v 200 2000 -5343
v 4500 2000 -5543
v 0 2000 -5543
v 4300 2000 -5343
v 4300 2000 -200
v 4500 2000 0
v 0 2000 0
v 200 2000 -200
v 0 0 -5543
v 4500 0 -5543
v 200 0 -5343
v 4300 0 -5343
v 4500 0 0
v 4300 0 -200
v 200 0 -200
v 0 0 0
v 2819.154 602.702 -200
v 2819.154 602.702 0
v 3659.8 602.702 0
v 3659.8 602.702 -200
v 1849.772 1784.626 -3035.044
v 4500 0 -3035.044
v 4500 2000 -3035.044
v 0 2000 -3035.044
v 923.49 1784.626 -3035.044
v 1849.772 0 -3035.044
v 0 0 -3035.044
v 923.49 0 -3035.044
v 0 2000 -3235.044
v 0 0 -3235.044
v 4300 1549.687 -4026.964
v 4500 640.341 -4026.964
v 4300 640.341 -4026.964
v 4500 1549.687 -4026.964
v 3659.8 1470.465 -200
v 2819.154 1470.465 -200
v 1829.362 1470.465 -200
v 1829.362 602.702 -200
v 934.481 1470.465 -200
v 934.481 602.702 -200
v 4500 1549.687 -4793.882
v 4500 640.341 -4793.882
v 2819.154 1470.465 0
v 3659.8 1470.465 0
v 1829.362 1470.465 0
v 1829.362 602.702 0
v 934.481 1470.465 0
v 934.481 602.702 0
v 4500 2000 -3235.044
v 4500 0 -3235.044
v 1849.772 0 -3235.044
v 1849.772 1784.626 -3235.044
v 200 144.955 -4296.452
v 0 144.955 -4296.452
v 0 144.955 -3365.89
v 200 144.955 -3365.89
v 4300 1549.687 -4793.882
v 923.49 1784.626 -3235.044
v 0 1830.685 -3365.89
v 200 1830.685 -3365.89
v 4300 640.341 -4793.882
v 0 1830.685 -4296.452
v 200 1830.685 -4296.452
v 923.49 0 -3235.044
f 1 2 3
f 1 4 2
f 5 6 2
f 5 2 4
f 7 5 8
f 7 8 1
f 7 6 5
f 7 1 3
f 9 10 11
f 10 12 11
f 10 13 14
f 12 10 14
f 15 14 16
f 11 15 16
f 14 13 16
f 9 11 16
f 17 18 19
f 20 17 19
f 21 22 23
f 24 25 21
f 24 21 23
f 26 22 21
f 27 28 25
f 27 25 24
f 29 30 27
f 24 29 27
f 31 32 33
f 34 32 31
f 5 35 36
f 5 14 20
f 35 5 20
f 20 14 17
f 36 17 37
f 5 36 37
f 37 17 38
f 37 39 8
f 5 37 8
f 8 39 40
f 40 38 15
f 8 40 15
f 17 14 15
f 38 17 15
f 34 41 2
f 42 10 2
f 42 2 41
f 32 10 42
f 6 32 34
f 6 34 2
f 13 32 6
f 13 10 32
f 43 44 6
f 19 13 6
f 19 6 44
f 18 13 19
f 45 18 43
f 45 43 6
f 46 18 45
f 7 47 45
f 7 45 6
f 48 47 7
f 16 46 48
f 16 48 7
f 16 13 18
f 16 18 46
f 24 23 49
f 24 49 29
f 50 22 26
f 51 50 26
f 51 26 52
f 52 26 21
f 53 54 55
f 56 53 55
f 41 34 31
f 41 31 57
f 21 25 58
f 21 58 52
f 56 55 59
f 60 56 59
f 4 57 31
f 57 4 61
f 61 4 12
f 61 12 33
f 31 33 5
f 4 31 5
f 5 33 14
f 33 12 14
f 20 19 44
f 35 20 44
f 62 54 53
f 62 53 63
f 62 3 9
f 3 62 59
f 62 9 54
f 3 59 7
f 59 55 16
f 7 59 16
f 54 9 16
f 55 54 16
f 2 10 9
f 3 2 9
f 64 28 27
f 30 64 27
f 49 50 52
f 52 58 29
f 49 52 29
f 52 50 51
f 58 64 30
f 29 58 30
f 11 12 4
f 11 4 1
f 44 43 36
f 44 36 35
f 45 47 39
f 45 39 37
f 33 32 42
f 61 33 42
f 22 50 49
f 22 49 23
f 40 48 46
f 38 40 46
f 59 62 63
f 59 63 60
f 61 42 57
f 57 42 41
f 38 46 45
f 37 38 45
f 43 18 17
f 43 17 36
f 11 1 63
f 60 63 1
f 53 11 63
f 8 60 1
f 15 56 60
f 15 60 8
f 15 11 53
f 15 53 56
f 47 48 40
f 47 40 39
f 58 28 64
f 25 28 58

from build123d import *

# Parameters (mm, degrees)
EXTRUDE_1_OUTLINE_W   = 4500
EXTRUDE_1_OUTLINE_H   = 5543
EXTRUDE_1_OUTLINE_W_2 = 4100
EXTRUDE_1_OUTLINE_H_2 = 5143
EXTRUDE_1_DEPTH       = 2000
EXTRUDE_1_2_OUTLINE_W = 4500
EXTRUDE_1_2_OUTLINE_H = 200
EXTRUDE_1_2_DEPTH     = 2000
SKETCH_3_W            = 894.880767268
SKETCH_3_H            = 867.76316826
SKETCH_3_W_2          = 840.645569252
CUT_EXTRUDE_1_DEPTH   = 200
SKETCH_4_W            = 926.281817019
SKETCH_4_H            = 1784.625837091
CUT_EXTRUDE_2_DEPTH   = 200
SKETCH_5_W            = 766.917931954
SKETCH_5_H            = 909.345547887
CUT_EXTRUDE_3_DEPTH   = 200
SKETCH_6_W            = 930.561753535
SKETCH_6_H            = 1685.729668706
CUT_EXTRUDE_4_DEPTH   = 200


# Read off the part's stored shape, not the designer's step: Вытянуть-Тонкостенный1
with BuildPart() as part:
    # Вытянуть-Тонкостенный1 outline → Вытянуть-Тонкостенный1 (new body)
    with BuildSketch(Plane(origin=(0, 0, 0), x_dir=(-1, 0, 0), z_dir=(0, 1, 0))):
        with Locations((-2250, -2771.5)):
            Rectangle(EXTRUDE_1_OUTLINE_W, EXTRUDE_1_OUTLINE_H)
        with Locations((-2250, -2771.5)):
            Rectangle(EXTRUDE_1_OUTLINE_W_2, EXTRUDE_1_OUTLINE_H_2, mode=Mode.SUBTRACT)
    extrude(amount=EXTRUDE_1_DEPTH)

    # Эскиз3 → Вырез-Вытянуть1 (cut)
    with BuildSketch(Plane.XY):
        with Locations((1381.9214075, 1036.583100649)):
            Rectangle(SKETCH_3_W, SKETCH_3_H)
        with Locations((3239.476939556, 1036.583100649)):
            Rectangle(SKETCH_3_W_2, SKETCH_3_H)
    extrude(amount=-CUT_EXTRUDE_1_DEPTH, mode=Mode.SUBTRACT)

    # Эскиз5 → Вырез-Вытянуть3 (cut)
    with BuildSketch(Plane(origin=(4500, 0, 0), x_dir=(0, 0, -1), z_dir=(1, 0, 0))):
        with Locations((4410.423442282, 1095.014257943)):
            Rectangle(SKETCH_5_W, SKETCH_5_H)
    extrude(amount=-CUT_EXTRUDE_3_DEPTH, mode=Mode.SUBTRACT)

    # Эскиз6 → Вырез-Вытянуть4 (cut)
    with BuildSketch(Plane.ZY):
        with Locations((-3831.171106774, 987.819872336)):
            Rectangle(SKETCH_6_W, SKETCH_6_H)
    extrude(amount=-CUT_EXTRUDE_4_DEPTH, mode=Mode.SUBTRACT)


with BuildPart() as body_2:
    # Extrude 1 2 outline → Extrude 1 2 (new body)
    with BuildSketch(Plane(origin=(0, 0, 0), x_dir=(-1, 0, 0), z_dir=(0, 1, 0))):
        with Locations((-2250, -3135.044271929)):
            Rectangle(EXTRUDE_1_2_OUTLINE_W, EXTRUDE_1_2_OUTLINE_H)
    extrude(amount=EXTRUDE_1_2_DEPTH)

    # Эскиз4 → Вырез-Вытянуть2 (cut)
    with BuildSketch(Plane.XY.offset(-3035.044271929)):
        with Locations((1386.631071625, 892.312918546)):
            Rectangle(SKETCH_4_W, SKETCH_4_H)
    extrude(amount=-CUT_EXTRUDE_2_DEPTH, mode=Mode.SUBTRACT)


solid = Compound([part.part, body_2.part])
